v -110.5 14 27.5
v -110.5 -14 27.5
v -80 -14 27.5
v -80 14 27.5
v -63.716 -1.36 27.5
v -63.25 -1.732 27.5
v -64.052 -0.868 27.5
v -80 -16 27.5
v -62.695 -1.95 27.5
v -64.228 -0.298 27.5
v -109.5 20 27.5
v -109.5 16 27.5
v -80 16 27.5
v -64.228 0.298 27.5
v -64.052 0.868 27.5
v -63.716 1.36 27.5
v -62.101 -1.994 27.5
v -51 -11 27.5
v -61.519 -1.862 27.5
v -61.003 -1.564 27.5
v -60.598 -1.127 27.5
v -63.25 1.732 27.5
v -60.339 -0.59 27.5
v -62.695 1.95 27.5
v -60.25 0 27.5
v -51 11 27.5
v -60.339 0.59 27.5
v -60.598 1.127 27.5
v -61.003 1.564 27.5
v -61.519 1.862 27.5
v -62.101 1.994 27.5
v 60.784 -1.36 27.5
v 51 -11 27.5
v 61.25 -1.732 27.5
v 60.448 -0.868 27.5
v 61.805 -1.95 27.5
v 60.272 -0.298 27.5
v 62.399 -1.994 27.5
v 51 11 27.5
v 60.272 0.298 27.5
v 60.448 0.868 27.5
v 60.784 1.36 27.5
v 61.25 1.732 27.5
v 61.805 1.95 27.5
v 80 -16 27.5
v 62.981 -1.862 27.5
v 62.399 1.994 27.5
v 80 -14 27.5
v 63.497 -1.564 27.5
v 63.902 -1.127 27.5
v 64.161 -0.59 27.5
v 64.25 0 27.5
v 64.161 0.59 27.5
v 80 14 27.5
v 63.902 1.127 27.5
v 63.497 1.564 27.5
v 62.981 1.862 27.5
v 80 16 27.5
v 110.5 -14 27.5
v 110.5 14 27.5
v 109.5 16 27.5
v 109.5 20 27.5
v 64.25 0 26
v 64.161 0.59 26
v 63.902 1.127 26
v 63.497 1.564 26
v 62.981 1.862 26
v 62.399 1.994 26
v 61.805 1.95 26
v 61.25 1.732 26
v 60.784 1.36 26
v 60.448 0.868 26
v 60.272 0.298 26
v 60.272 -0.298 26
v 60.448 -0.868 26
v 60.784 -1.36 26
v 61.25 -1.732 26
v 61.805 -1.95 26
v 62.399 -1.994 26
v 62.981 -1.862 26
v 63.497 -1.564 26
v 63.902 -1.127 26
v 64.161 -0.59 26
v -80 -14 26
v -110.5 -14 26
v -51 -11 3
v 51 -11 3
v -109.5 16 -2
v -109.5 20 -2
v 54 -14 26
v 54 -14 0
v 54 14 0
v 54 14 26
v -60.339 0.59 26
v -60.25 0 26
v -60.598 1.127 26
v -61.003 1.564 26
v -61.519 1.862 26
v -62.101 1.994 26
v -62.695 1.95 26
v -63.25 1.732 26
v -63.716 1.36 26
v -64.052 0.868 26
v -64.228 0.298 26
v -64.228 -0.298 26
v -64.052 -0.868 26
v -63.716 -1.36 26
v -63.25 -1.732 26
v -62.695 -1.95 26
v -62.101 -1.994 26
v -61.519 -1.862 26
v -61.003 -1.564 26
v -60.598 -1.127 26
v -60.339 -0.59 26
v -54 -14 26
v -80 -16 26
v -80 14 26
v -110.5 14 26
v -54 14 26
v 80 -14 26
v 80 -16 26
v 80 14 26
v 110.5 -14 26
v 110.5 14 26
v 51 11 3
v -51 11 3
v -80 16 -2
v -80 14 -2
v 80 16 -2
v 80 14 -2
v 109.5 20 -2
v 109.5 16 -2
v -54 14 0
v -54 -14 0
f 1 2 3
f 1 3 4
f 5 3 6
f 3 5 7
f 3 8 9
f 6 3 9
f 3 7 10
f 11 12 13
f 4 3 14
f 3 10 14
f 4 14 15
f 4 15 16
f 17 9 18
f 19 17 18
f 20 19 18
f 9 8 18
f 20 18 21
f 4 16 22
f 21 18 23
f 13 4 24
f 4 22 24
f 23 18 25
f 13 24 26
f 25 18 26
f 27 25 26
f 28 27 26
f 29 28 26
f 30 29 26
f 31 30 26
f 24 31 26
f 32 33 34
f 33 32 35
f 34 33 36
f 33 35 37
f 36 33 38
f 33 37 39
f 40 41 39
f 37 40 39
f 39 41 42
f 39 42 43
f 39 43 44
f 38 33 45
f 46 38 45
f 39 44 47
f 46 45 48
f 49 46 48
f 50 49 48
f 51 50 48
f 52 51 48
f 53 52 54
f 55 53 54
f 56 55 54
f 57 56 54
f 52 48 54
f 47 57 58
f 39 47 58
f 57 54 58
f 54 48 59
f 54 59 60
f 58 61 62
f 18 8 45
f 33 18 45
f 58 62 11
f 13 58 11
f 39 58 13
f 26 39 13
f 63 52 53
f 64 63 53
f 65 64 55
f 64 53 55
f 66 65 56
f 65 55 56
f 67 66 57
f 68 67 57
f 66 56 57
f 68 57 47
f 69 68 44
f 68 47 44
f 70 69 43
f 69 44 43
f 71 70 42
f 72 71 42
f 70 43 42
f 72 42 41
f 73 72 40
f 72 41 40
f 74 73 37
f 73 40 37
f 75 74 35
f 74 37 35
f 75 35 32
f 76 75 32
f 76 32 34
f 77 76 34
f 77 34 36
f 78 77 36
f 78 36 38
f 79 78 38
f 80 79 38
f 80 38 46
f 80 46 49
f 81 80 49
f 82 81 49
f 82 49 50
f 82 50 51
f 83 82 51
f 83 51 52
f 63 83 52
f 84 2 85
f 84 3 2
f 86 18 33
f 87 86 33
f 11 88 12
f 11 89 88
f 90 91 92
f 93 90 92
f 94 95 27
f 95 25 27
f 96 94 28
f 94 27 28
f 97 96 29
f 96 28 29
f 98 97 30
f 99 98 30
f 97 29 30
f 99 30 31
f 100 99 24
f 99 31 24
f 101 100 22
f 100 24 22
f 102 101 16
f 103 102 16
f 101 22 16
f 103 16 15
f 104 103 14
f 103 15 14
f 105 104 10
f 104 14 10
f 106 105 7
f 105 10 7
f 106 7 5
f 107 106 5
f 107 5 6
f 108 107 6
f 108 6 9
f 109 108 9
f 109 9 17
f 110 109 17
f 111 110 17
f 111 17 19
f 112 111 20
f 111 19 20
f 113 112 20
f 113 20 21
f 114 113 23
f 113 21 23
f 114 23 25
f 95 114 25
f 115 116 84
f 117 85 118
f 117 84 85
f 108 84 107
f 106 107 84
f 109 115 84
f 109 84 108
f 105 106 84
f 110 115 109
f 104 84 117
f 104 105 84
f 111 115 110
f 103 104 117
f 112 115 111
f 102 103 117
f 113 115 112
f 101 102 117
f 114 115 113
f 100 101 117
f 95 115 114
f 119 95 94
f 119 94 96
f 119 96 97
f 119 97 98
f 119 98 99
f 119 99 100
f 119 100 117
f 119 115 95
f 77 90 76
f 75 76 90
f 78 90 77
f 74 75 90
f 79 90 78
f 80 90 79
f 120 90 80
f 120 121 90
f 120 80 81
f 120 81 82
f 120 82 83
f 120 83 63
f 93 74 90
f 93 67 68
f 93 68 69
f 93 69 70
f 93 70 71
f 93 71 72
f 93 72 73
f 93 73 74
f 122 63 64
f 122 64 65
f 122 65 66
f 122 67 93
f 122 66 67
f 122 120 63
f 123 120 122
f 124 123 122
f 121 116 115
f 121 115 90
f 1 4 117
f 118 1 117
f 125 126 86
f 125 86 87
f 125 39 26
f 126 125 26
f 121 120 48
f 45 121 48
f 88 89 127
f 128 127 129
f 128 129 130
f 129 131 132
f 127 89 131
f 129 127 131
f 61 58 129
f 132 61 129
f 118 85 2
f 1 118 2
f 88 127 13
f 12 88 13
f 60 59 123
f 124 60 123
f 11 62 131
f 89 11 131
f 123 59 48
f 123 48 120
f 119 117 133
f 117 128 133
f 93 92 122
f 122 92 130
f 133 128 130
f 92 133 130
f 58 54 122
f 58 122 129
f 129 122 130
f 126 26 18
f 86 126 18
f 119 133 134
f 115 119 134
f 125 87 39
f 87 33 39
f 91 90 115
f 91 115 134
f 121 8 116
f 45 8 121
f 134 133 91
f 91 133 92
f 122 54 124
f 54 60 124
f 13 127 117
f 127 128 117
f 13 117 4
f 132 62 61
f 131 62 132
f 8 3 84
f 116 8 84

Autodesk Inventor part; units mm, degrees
ref_plane "YZ Plane" through (0, 0, 0) normal (1, 0, 0) x (0, 1, 0)
ref_plane "XZ Plane" through (0, 0, 0) normal (0, 1, 0) x (-1, 0, 0)
ref_plane "XY Plane" through (0, 0, 0) normal (0, 0, 1) x (1, 0, 0)
sketch "Эскиз1" plane through (0, 0, 0) normal (0, 0, 1) x (1, 0, 0)
  line L0 (-54, -14) -> (54, -14)
  line L1 (54, -14) -> (54, 14)
  line L2 (54, 14) -> (-54, 14)
  line L3 (-54, 14) -> (-54, -14)
  line L4 (-54, -14) -> (54, 14) construction
  line L5 (54, -14) -> (-54, 14) construction
  point P0 (0, 0)
  dimension "d0" = 108
  dimension "d1" = 28
extrude "Выдавливание1" add sketch "Эскиз1" along normal blind 27.5
sketch "Эскиз2" plane through (0, 0, 27.5) normal (0, 0, 1) x (1, 0, 0)
  line L0 (-51, -11) -> (51, -11)
  line L1 (51, -11) -> (51, 11)
  line L2 (51, 11) -> (-51, 11)
  line L3 (-51, 11) -> (-51, -11)
  line L4 (-51, -11) -> (51, 11) construction
  line L5 (51, -11) -> (-51, 11) construction
  line L6 (54, 14) -> (-54, 14) projected
  line L7 (54, -14) -> (54, 14) projected
  point P0 (0, 0)
  dimension "d4" = 3
  dimension "d5" = 3
extrude "Выдавливание2" cut sketch "Эскиз2" against normal blind 24.5
sketch "Эскиз3" plane through (54, -14, 0) normal (1, 0, 0) x (0, 0, -1)
  line L0 (0, 28) -> (-27.5, 28) projected
  line L1 (0, 0) -> (-27.5, 0) projected
  line L2 (-27.5, 28) -> (-26, 28)
  line L3 (-26, 28) -> (-26, 0)
  line L4 (-26, 0) -> (-27.5, 0)
  line L5 (-27.5, 0) -> (-27.5, 28)
  point P0 (0, 14)
  dimension "d8" = 1.5
extrude "Выдавливание3" add sketch "Эскиз3" along normal blind 50
mirror "Зеркальное отражение1" about plane through (0, 0, 0) normal (1, 0, 0) of "Выдавливание3"
move faces "Перенос1" translate (6.5, 0, 0) faces at (104, 4.6667, 27)
move faces "Перенос2" translate (-6.5, 0, 0) faces at (-104, 4.6667, 27)
sketch "Эскиз7" plane through (-54, -14, 0) normal (0, -1, 0) x (1, 0, 0)
  line L0 (-56.5, 27.5) -> (164.5, 27.5) projected
  line L1 (0, 26) -> (-56.5, 26) projected
  line L2 (134, 27.5) -> (-26, 27.5)
  line L3 (-26, 27.5) -> (-26, 26)
  line L4 (-26, 26) -> (134, 26)
  line L5 (134, 26) -> (134, 27.5)
  line L6 (0, 0) -> (108, 0) projected
  point P0 (54, 0)
  point P1 (-26, 26.75)
  point P2 (54, 0)
  dimension "d29" = 160
  dimension "d30" = 80
extrude "Выдавливание7" add sketch "Эскиз7" along normal blind 2
sketch "Эскиз8" plane through (-54, 14, 0) normal (0, 1, 0) x (1, 0, 0)
  line L0 (-56.5, -27.5) -> (164.5, -27.5) projected
  line L1 (-26, -27.5) -> (134, -27.5)
  line L2 (134, -27.5) -> (134, 2)
  line L3 (134, 2) -> (-26, 2)
  line L4 (-26, 2) -> (-26, -27.5)
  line L5 (108, 0) -> (0, 0) projected
  point P0 (54, 0)
  point P1 (54, 0)
  dimension "d33" = 160
  dimension "d34" = 80
  dimension "d35" = 29.5
extrude "Выдавливание8" add sketch "Эскиз8" along normal blind 6
sketch "Эскиз9" plane through (80, 14, 26) normal (1, 0, 0) x (0, 0, -1)
  line L0 (28, 0) -> (28, 6) projected
  line L1 (28, 6) -> (-1.5, 6)
  line L2 (-1.5, 6) -> (-1.5, 2)
  line L3 (-1.5, 2) -> (28, 2)
  line L4 (28, 2) -> (28, 6)
  point P0 (26, -14)
  dimension "d38" = 4
extrude "Выдавливание9" add sketch "Эскиз9" along normal blind 29.5
mirror "Зеркальное отражение3" about plane through (0, 0, 0) normal (1, 0, 0) of "Выдавливание9"
sketch "Эскиз10" plane through (0, 0, 27.5) normal (0, 0, 1) x (1, 0, 0)
  circle A0 centre (-62.25, 0) radius 2 projected
  circle A1 centre (62.25, 0) radius 2 projected
  point P0 (0, 0)
extrude "Выдавливание10" cut sketch "Эскиз10" against normal through all
equation "\"d30\" = 0.5 * d29"
equation "\"d34\" = 0.5 * d33"
properties part number "000.009 - Короб" material "Пластик АБС"
